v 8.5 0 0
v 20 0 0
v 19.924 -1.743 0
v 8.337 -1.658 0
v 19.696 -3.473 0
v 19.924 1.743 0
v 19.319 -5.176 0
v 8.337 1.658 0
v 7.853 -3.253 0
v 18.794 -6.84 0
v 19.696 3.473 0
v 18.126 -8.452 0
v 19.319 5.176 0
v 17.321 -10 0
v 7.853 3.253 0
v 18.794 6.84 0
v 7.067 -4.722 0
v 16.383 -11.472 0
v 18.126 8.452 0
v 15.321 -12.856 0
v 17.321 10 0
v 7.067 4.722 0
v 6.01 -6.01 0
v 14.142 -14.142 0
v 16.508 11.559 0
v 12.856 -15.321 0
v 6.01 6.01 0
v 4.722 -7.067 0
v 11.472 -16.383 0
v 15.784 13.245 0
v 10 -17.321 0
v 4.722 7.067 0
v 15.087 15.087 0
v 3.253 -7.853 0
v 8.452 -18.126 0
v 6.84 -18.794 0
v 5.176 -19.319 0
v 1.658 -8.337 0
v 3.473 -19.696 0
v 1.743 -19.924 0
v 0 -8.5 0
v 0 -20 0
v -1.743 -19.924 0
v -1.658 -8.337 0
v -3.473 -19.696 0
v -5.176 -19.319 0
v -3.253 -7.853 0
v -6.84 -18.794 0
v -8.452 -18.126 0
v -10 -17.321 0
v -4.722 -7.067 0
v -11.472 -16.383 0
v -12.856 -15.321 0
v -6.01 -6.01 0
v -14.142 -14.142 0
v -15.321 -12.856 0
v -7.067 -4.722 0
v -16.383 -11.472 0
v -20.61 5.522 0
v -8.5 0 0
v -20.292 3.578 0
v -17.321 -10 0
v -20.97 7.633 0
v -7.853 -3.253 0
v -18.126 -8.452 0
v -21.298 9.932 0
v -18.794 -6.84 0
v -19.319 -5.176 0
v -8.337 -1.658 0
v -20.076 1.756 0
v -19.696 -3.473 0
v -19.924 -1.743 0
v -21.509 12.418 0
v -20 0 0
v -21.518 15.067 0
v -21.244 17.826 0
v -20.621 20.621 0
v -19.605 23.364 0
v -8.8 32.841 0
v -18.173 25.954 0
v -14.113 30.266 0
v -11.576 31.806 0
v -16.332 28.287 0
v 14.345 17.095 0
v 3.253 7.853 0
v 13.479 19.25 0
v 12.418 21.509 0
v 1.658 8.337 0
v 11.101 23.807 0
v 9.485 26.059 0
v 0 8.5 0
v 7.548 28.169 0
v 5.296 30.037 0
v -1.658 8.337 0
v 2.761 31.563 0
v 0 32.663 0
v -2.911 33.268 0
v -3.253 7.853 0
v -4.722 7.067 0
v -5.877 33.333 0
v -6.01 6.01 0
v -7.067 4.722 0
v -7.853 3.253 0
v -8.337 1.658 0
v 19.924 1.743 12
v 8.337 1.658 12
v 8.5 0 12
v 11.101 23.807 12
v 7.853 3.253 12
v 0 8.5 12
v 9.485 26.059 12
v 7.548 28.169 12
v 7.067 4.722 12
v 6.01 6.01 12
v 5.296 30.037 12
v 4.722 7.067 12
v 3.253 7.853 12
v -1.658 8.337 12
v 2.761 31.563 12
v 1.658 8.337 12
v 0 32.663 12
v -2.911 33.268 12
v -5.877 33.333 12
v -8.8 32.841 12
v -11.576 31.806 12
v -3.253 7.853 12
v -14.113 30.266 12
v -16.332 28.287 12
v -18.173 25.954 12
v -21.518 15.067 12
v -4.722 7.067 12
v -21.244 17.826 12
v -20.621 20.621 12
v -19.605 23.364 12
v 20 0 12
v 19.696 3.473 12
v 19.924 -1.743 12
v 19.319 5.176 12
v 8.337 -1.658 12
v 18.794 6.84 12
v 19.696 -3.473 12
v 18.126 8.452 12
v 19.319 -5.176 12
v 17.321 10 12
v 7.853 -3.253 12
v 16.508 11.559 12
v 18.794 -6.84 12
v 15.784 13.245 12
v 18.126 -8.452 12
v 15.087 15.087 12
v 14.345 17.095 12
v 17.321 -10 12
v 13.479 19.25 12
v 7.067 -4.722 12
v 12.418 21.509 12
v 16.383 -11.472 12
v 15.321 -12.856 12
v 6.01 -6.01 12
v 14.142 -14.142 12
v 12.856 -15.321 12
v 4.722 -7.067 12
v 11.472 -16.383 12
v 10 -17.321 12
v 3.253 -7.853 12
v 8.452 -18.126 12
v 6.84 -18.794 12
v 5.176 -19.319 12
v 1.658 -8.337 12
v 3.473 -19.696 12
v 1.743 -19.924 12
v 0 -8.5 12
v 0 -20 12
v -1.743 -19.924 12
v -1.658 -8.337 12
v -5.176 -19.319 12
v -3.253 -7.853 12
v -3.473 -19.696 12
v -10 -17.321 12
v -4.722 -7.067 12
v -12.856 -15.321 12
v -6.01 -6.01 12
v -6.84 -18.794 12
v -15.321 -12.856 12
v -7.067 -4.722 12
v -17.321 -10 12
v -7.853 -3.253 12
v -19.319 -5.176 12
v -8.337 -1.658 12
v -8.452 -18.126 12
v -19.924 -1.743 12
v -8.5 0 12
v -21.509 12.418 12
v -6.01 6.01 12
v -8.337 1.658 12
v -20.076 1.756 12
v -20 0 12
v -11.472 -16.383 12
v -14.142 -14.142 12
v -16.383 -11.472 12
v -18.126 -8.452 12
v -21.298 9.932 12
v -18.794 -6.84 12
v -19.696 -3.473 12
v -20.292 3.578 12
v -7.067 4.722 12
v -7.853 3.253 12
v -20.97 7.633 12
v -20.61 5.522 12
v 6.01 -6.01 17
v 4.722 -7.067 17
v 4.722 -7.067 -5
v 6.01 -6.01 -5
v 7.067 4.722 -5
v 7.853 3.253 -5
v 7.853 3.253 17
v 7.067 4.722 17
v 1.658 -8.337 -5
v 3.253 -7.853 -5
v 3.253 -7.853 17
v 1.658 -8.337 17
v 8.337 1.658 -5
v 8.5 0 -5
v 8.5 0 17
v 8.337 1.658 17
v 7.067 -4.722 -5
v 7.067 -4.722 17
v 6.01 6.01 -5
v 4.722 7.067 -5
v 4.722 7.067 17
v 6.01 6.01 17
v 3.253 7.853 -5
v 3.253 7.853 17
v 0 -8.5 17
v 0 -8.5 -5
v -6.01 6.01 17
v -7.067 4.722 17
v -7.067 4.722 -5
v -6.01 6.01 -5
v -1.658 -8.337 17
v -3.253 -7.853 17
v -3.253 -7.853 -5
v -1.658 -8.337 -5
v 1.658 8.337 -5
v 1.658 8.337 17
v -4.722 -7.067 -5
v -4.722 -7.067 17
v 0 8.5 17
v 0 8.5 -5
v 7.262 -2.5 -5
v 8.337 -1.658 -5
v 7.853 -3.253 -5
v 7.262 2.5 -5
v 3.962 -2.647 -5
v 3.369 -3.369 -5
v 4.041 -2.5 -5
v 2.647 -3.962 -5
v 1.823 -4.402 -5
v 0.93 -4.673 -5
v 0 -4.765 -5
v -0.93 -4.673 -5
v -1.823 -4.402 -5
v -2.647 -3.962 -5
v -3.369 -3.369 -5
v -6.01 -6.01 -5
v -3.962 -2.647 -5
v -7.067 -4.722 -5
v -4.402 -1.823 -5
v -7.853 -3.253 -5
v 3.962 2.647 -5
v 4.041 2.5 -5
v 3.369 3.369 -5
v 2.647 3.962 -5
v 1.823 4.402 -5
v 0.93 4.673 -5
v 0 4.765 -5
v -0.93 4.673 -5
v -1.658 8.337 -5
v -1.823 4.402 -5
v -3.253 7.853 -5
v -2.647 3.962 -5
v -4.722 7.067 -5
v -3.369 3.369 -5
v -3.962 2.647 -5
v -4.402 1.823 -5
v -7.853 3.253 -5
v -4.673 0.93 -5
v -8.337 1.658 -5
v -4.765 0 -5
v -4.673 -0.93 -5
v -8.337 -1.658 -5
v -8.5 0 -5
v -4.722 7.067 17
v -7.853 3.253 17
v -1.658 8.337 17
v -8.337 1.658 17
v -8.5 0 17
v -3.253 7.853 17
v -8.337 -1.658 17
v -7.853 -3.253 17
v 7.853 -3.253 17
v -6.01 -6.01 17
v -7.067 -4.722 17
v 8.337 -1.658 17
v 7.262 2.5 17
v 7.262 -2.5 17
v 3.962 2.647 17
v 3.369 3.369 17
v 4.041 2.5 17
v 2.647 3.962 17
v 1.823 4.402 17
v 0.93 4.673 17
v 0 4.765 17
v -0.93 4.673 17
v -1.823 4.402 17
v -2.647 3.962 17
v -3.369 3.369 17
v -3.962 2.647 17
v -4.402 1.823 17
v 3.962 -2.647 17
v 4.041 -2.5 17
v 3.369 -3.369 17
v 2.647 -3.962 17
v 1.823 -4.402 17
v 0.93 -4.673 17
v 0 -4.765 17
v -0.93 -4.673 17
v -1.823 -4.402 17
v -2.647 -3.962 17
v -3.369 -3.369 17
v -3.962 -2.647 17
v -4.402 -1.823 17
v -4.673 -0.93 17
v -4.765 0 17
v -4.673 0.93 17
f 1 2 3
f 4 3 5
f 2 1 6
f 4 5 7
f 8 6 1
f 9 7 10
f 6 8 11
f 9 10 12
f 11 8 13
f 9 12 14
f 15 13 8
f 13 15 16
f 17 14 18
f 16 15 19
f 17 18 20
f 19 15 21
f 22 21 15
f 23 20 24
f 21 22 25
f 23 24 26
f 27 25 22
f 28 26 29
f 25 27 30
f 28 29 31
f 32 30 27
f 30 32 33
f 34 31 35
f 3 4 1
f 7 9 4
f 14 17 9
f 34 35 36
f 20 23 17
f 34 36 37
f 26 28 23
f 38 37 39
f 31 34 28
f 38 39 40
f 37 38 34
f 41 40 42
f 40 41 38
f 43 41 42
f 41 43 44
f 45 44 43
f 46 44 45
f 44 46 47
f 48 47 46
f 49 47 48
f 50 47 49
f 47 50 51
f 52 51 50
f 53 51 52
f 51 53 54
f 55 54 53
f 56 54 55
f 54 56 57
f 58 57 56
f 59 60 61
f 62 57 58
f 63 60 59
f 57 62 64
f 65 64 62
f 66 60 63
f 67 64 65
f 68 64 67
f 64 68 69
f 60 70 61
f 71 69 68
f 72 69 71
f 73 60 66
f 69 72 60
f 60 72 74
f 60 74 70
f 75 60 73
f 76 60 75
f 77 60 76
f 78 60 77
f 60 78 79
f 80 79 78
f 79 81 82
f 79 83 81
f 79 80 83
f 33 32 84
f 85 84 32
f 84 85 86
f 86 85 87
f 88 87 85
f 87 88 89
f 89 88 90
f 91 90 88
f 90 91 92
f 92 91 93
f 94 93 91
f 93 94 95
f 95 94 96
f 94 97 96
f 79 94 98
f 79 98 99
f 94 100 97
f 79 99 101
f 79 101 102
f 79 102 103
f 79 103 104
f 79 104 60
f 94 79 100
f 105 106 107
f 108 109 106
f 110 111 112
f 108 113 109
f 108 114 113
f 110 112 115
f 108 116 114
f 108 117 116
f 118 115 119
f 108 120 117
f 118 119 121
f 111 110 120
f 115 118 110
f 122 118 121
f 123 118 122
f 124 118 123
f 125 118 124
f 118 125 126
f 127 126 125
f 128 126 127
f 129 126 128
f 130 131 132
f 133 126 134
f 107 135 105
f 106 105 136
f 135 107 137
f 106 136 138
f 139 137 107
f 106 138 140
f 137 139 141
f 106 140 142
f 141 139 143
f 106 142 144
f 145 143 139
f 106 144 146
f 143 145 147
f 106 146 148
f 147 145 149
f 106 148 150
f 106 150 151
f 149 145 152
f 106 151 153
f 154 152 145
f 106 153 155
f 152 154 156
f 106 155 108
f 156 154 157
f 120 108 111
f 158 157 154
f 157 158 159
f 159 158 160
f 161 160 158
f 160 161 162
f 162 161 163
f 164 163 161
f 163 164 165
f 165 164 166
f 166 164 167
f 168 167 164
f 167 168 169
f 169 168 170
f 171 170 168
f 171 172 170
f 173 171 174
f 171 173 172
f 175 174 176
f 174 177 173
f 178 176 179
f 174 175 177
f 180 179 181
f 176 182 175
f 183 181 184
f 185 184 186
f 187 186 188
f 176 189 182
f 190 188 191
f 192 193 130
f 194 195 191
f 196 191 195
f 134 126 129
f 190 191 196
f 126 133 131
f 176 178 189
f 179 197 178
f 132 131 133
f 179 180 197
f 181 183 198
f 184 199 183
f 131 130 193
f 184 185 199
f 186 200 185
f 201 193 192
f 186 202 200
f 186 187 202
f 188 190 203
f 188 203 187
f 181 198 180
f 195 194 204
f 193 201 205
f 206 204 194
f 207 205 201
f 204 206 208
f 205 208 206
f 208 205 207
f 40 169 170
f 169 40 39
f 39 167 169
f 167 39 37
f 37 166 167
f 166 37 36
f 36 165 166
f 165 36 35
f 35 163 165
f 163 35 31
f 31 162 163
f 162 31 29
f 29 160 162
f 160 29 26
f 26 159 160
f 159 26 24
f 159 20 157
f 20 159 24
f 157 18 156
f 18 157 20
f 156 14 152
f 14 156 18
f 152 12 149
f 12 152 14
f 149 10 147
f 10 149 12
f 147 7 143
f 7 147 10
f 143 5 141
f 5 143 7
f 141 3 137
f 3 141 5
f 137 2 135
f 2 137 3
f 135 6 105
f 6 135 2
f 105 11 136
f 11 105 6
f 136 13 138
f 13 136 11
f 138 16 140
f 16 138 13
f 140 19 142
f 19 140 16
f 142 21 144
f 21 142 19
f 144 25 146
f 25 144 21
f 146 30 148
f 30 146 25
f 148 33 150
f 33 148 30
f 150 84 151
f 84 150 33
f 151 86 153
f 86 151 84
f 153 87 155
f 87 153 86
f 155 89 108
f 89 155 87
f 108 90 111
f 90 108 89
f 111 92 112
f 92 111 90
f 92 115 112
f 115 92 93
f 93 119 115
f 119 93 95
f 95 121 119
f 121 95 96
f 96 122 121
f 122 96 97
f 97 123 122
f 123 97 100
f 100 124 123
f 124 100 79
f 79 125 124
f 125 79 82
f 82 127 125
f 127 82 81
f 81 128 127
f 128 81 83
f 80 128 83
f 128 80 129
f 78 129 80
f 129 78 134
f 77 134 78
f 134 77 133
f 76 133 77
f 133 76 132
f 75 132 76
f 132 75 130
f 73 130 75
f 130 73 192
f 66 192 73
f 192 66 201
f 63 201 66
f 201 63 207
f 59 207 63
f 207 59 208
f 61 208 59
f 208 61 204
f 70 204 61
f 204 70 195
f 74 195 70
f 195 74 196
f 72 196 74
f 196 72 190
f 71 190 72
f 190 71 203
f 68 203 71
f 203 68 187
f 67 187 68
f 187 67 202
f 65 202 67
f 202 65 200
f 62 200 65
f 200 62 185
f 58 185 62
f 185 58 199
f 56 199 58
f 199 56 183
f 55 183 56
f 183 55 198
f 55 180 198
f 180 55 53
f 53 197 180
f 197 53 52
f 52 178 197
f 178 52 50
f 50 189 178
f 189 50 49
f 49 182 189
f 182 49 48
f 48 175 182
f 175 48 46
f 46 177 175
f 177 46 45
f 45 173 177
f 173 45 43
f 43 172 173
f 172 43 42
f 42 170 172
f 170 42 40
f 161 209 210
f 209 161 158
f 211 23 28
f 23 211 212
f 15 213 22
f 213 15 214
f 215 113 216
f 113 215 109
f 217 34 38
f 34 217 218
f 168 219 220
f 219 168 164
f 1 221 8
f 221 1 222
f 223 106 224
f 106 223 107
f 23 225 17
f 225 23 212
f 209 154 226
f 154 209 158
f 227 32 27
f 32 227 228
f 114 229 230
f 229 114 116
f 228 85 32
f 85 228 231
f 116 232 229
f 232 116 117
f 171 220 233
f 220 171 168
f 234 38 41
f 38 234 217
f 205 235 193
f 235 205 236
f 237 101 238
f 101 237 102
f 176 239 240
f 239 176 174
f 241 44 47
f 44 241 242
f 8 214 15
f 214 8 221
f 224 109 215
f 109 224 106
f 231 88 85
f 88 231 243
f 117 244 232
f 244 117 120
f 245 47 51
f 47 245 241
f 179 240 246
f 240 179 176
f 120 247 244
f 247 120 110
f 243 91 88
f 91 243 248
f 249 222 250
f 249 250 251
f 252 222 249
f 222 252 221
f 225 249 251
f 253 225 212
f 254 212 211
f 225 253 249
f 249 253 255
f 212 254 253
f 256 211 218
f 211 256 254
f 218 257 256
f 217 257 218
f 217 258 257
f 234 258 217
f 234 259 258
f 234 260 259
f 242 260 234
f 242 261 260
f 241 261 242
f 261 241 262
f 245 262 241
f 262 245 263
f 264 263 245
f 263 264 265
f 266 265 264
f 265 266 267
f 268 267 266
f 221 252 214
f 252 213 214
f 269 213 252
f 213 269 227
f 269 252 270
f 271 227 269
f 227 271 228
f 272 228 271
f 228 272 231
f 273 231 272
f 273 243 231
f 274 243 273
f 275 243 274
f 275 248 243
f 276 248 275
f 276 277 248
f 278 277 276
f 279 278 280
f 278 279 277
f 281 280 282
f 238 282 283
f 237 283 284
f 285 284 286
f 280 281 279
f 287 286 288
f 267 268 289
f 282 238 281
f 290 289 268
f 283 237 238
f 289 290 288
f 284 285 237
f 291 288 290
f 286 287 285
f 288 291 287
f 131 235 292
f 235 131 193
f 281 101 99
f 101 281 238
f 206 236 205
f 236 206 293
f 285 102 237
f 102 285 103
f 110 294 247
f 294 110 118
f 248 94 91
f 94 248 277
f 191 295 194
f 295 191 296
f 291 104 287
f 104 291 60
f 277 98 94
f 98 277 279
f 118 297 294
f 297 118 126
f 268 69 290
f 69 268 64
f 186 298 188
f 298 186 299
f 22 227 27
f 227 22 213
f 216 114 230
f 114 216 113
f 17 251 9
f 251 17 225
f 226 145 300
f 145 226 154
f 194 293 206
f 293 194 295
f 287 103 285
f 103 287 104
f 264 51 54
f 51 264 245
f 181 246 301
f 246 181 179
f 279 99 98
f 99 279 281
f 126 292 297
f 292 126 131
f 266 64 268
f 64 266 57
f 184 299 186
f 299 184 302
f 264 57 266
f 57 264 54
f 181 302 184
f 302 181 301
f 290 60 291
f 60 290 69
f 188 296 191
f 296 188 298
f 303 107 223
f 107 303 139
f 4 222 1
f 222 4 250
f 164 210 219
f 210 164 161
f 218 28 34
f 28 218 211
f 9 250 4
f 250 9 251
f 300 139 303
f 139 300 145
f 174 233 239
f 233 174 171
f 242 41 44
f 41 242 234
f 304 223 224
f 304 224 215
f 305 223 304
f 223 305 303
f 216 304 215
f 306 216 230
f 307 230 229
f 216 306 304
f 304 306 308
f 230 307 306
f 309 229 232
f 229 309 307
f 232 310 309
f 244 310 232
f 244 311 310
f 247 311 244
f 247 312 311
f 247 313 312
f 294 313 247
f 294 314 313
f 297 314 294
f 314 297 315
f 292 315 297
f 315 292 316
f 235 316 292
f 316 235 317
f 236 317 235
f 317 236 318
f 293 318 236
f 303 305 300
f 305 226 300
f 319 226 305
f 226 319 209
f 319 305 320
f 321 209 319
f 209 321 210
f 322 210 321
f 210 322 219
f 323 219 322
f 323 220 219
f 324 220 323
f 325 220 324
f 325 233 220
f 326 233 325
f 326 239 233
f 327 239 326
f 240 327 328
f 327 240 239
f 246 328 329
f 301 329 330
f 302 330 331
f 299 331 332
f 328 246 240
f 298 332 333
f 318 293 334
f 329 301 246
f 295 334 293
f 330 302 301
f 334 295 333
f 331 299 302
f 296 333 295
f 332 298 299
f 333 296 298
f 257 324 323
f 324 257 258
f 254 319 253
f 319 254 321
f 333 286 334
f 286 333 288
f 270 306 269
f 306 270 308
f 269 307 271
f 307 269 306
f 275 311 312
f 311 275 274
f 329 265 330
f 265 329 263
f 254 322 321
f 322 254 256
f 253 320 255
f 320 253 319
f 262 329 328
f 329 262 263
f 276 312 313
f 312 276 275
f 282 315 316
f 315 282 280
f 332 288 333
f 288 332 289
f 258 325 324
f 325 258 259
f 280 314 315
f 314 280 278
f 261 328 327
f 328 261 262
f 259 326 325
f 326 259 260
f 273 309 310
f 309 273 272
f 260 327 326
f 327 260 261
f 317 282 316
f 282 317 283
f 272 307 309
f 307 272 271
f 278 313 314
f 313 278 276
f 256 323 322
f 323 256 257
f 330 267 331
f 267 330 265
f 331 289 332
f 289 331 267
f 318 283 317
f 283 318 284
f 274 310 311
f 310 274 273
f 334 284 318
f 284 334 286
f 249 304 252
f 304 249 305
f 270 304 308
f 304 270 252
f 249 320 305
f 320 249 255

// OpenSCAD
$fn = 32;

// ----------------------------------------------------------------------
// Cam: base radius 20 mm with a 14 mm lift over 150 degrees
// ----------------------------------------------------------------------

// --- parameters (mm) ---
base_r = 20;              // base radius
lift = 14;                // lift height above the base radius
lift_span = 150;          // angular width of the lift
lift_start = 30;          // angle where the lift starts
cam_t = 12;               // cam plate thickness
hub_d = 17;               // hub diameter
hub_h = 22;               // hub height
bore_d = 9.53;            // bore
key_w = 5;                // keyway width
key_depth = 1.74;         // keyway depth

cam_profile = [[20, 0], [19.924, 1.743], [19.696, 3.473], [19.319, 5.176], [18.794, 6.84], [18.126, 8.452], [17.321, 10], [16.508, 11.559], [15.784, 13.245], [15.087, 15.087], [14.345, 17.095], [13.479, 19.25], [12.418, 21.509], [11.101, 23.807], [9.485, 26.059], [7.548, 28.169], [5.296, 30.037], [2.761, 31.563], [0, 32.663], [-2.911, 33.268], [-5.877, 33.333], [-8.8, 32.841], [-11.576, 31.806], [-14.113, 30.266], [-16.332, 28.287], [-18.173, 25.954], [-19.605, 23.364], [-20.621, 20.621], [-21.244, 17.826], [-21.518, 15.067], [-21.509, 12.418], [-21.298, 9.932], [-20.97, 7.633], [-20.61, 5.522], [-20.292, 3.578], [-20.076, 1.756], [-20, 0], [-19.924, -1.743], [-19.696, -3.473], [-19.319, -5.176], [-18.794, -6.84], [-18.126, -8.452], [-17.321, -10], [-16.383, -11.472], [-15.321, -12.856], [-14.142, -14.142], [-12.856, -15.321], [-11.472, -16.383], [-10, -17.321], [-8.452, -18.126], [-6.84, -18.794], [-5.176, -19.319], [-3.473, -19.696], [-1.743, -19.924], [0, -20], [1.743, -19.924], [3.473, -19.696], [5.176, -19.319], [6.84, -18.794], [8.452, -18.126], [10, -17.321], [11.472, -16.383], [12.856, -15.321], [14.142, -14.142], [15.321, -12.856], [16.383, -11.472], [17.321, -10], [18.126, -8.452], [18.794, -6.84], [19.319, -5.176], [19.696, -3.473], [19.924, -1.743]];

difference() {
  union() {
    linear_extrude(height = cam_t) polygon(cam_profile);
    /* hub, proud of the cam plate on both sides */
    translate([0, 0, -5]) cylinder(h = hub_h, d = hub_d);
  }
  /* bore through the hub, 2.5 mm clear on both faces */
  translate([0, 0, -7.5]) cylinder(h = hub_h + 5, d = bore_d);
  /* keyway, milled through the whole hub */
  translate([3.022, -2.5, -7.5]) cube([4.24, 5, 27]);
}
